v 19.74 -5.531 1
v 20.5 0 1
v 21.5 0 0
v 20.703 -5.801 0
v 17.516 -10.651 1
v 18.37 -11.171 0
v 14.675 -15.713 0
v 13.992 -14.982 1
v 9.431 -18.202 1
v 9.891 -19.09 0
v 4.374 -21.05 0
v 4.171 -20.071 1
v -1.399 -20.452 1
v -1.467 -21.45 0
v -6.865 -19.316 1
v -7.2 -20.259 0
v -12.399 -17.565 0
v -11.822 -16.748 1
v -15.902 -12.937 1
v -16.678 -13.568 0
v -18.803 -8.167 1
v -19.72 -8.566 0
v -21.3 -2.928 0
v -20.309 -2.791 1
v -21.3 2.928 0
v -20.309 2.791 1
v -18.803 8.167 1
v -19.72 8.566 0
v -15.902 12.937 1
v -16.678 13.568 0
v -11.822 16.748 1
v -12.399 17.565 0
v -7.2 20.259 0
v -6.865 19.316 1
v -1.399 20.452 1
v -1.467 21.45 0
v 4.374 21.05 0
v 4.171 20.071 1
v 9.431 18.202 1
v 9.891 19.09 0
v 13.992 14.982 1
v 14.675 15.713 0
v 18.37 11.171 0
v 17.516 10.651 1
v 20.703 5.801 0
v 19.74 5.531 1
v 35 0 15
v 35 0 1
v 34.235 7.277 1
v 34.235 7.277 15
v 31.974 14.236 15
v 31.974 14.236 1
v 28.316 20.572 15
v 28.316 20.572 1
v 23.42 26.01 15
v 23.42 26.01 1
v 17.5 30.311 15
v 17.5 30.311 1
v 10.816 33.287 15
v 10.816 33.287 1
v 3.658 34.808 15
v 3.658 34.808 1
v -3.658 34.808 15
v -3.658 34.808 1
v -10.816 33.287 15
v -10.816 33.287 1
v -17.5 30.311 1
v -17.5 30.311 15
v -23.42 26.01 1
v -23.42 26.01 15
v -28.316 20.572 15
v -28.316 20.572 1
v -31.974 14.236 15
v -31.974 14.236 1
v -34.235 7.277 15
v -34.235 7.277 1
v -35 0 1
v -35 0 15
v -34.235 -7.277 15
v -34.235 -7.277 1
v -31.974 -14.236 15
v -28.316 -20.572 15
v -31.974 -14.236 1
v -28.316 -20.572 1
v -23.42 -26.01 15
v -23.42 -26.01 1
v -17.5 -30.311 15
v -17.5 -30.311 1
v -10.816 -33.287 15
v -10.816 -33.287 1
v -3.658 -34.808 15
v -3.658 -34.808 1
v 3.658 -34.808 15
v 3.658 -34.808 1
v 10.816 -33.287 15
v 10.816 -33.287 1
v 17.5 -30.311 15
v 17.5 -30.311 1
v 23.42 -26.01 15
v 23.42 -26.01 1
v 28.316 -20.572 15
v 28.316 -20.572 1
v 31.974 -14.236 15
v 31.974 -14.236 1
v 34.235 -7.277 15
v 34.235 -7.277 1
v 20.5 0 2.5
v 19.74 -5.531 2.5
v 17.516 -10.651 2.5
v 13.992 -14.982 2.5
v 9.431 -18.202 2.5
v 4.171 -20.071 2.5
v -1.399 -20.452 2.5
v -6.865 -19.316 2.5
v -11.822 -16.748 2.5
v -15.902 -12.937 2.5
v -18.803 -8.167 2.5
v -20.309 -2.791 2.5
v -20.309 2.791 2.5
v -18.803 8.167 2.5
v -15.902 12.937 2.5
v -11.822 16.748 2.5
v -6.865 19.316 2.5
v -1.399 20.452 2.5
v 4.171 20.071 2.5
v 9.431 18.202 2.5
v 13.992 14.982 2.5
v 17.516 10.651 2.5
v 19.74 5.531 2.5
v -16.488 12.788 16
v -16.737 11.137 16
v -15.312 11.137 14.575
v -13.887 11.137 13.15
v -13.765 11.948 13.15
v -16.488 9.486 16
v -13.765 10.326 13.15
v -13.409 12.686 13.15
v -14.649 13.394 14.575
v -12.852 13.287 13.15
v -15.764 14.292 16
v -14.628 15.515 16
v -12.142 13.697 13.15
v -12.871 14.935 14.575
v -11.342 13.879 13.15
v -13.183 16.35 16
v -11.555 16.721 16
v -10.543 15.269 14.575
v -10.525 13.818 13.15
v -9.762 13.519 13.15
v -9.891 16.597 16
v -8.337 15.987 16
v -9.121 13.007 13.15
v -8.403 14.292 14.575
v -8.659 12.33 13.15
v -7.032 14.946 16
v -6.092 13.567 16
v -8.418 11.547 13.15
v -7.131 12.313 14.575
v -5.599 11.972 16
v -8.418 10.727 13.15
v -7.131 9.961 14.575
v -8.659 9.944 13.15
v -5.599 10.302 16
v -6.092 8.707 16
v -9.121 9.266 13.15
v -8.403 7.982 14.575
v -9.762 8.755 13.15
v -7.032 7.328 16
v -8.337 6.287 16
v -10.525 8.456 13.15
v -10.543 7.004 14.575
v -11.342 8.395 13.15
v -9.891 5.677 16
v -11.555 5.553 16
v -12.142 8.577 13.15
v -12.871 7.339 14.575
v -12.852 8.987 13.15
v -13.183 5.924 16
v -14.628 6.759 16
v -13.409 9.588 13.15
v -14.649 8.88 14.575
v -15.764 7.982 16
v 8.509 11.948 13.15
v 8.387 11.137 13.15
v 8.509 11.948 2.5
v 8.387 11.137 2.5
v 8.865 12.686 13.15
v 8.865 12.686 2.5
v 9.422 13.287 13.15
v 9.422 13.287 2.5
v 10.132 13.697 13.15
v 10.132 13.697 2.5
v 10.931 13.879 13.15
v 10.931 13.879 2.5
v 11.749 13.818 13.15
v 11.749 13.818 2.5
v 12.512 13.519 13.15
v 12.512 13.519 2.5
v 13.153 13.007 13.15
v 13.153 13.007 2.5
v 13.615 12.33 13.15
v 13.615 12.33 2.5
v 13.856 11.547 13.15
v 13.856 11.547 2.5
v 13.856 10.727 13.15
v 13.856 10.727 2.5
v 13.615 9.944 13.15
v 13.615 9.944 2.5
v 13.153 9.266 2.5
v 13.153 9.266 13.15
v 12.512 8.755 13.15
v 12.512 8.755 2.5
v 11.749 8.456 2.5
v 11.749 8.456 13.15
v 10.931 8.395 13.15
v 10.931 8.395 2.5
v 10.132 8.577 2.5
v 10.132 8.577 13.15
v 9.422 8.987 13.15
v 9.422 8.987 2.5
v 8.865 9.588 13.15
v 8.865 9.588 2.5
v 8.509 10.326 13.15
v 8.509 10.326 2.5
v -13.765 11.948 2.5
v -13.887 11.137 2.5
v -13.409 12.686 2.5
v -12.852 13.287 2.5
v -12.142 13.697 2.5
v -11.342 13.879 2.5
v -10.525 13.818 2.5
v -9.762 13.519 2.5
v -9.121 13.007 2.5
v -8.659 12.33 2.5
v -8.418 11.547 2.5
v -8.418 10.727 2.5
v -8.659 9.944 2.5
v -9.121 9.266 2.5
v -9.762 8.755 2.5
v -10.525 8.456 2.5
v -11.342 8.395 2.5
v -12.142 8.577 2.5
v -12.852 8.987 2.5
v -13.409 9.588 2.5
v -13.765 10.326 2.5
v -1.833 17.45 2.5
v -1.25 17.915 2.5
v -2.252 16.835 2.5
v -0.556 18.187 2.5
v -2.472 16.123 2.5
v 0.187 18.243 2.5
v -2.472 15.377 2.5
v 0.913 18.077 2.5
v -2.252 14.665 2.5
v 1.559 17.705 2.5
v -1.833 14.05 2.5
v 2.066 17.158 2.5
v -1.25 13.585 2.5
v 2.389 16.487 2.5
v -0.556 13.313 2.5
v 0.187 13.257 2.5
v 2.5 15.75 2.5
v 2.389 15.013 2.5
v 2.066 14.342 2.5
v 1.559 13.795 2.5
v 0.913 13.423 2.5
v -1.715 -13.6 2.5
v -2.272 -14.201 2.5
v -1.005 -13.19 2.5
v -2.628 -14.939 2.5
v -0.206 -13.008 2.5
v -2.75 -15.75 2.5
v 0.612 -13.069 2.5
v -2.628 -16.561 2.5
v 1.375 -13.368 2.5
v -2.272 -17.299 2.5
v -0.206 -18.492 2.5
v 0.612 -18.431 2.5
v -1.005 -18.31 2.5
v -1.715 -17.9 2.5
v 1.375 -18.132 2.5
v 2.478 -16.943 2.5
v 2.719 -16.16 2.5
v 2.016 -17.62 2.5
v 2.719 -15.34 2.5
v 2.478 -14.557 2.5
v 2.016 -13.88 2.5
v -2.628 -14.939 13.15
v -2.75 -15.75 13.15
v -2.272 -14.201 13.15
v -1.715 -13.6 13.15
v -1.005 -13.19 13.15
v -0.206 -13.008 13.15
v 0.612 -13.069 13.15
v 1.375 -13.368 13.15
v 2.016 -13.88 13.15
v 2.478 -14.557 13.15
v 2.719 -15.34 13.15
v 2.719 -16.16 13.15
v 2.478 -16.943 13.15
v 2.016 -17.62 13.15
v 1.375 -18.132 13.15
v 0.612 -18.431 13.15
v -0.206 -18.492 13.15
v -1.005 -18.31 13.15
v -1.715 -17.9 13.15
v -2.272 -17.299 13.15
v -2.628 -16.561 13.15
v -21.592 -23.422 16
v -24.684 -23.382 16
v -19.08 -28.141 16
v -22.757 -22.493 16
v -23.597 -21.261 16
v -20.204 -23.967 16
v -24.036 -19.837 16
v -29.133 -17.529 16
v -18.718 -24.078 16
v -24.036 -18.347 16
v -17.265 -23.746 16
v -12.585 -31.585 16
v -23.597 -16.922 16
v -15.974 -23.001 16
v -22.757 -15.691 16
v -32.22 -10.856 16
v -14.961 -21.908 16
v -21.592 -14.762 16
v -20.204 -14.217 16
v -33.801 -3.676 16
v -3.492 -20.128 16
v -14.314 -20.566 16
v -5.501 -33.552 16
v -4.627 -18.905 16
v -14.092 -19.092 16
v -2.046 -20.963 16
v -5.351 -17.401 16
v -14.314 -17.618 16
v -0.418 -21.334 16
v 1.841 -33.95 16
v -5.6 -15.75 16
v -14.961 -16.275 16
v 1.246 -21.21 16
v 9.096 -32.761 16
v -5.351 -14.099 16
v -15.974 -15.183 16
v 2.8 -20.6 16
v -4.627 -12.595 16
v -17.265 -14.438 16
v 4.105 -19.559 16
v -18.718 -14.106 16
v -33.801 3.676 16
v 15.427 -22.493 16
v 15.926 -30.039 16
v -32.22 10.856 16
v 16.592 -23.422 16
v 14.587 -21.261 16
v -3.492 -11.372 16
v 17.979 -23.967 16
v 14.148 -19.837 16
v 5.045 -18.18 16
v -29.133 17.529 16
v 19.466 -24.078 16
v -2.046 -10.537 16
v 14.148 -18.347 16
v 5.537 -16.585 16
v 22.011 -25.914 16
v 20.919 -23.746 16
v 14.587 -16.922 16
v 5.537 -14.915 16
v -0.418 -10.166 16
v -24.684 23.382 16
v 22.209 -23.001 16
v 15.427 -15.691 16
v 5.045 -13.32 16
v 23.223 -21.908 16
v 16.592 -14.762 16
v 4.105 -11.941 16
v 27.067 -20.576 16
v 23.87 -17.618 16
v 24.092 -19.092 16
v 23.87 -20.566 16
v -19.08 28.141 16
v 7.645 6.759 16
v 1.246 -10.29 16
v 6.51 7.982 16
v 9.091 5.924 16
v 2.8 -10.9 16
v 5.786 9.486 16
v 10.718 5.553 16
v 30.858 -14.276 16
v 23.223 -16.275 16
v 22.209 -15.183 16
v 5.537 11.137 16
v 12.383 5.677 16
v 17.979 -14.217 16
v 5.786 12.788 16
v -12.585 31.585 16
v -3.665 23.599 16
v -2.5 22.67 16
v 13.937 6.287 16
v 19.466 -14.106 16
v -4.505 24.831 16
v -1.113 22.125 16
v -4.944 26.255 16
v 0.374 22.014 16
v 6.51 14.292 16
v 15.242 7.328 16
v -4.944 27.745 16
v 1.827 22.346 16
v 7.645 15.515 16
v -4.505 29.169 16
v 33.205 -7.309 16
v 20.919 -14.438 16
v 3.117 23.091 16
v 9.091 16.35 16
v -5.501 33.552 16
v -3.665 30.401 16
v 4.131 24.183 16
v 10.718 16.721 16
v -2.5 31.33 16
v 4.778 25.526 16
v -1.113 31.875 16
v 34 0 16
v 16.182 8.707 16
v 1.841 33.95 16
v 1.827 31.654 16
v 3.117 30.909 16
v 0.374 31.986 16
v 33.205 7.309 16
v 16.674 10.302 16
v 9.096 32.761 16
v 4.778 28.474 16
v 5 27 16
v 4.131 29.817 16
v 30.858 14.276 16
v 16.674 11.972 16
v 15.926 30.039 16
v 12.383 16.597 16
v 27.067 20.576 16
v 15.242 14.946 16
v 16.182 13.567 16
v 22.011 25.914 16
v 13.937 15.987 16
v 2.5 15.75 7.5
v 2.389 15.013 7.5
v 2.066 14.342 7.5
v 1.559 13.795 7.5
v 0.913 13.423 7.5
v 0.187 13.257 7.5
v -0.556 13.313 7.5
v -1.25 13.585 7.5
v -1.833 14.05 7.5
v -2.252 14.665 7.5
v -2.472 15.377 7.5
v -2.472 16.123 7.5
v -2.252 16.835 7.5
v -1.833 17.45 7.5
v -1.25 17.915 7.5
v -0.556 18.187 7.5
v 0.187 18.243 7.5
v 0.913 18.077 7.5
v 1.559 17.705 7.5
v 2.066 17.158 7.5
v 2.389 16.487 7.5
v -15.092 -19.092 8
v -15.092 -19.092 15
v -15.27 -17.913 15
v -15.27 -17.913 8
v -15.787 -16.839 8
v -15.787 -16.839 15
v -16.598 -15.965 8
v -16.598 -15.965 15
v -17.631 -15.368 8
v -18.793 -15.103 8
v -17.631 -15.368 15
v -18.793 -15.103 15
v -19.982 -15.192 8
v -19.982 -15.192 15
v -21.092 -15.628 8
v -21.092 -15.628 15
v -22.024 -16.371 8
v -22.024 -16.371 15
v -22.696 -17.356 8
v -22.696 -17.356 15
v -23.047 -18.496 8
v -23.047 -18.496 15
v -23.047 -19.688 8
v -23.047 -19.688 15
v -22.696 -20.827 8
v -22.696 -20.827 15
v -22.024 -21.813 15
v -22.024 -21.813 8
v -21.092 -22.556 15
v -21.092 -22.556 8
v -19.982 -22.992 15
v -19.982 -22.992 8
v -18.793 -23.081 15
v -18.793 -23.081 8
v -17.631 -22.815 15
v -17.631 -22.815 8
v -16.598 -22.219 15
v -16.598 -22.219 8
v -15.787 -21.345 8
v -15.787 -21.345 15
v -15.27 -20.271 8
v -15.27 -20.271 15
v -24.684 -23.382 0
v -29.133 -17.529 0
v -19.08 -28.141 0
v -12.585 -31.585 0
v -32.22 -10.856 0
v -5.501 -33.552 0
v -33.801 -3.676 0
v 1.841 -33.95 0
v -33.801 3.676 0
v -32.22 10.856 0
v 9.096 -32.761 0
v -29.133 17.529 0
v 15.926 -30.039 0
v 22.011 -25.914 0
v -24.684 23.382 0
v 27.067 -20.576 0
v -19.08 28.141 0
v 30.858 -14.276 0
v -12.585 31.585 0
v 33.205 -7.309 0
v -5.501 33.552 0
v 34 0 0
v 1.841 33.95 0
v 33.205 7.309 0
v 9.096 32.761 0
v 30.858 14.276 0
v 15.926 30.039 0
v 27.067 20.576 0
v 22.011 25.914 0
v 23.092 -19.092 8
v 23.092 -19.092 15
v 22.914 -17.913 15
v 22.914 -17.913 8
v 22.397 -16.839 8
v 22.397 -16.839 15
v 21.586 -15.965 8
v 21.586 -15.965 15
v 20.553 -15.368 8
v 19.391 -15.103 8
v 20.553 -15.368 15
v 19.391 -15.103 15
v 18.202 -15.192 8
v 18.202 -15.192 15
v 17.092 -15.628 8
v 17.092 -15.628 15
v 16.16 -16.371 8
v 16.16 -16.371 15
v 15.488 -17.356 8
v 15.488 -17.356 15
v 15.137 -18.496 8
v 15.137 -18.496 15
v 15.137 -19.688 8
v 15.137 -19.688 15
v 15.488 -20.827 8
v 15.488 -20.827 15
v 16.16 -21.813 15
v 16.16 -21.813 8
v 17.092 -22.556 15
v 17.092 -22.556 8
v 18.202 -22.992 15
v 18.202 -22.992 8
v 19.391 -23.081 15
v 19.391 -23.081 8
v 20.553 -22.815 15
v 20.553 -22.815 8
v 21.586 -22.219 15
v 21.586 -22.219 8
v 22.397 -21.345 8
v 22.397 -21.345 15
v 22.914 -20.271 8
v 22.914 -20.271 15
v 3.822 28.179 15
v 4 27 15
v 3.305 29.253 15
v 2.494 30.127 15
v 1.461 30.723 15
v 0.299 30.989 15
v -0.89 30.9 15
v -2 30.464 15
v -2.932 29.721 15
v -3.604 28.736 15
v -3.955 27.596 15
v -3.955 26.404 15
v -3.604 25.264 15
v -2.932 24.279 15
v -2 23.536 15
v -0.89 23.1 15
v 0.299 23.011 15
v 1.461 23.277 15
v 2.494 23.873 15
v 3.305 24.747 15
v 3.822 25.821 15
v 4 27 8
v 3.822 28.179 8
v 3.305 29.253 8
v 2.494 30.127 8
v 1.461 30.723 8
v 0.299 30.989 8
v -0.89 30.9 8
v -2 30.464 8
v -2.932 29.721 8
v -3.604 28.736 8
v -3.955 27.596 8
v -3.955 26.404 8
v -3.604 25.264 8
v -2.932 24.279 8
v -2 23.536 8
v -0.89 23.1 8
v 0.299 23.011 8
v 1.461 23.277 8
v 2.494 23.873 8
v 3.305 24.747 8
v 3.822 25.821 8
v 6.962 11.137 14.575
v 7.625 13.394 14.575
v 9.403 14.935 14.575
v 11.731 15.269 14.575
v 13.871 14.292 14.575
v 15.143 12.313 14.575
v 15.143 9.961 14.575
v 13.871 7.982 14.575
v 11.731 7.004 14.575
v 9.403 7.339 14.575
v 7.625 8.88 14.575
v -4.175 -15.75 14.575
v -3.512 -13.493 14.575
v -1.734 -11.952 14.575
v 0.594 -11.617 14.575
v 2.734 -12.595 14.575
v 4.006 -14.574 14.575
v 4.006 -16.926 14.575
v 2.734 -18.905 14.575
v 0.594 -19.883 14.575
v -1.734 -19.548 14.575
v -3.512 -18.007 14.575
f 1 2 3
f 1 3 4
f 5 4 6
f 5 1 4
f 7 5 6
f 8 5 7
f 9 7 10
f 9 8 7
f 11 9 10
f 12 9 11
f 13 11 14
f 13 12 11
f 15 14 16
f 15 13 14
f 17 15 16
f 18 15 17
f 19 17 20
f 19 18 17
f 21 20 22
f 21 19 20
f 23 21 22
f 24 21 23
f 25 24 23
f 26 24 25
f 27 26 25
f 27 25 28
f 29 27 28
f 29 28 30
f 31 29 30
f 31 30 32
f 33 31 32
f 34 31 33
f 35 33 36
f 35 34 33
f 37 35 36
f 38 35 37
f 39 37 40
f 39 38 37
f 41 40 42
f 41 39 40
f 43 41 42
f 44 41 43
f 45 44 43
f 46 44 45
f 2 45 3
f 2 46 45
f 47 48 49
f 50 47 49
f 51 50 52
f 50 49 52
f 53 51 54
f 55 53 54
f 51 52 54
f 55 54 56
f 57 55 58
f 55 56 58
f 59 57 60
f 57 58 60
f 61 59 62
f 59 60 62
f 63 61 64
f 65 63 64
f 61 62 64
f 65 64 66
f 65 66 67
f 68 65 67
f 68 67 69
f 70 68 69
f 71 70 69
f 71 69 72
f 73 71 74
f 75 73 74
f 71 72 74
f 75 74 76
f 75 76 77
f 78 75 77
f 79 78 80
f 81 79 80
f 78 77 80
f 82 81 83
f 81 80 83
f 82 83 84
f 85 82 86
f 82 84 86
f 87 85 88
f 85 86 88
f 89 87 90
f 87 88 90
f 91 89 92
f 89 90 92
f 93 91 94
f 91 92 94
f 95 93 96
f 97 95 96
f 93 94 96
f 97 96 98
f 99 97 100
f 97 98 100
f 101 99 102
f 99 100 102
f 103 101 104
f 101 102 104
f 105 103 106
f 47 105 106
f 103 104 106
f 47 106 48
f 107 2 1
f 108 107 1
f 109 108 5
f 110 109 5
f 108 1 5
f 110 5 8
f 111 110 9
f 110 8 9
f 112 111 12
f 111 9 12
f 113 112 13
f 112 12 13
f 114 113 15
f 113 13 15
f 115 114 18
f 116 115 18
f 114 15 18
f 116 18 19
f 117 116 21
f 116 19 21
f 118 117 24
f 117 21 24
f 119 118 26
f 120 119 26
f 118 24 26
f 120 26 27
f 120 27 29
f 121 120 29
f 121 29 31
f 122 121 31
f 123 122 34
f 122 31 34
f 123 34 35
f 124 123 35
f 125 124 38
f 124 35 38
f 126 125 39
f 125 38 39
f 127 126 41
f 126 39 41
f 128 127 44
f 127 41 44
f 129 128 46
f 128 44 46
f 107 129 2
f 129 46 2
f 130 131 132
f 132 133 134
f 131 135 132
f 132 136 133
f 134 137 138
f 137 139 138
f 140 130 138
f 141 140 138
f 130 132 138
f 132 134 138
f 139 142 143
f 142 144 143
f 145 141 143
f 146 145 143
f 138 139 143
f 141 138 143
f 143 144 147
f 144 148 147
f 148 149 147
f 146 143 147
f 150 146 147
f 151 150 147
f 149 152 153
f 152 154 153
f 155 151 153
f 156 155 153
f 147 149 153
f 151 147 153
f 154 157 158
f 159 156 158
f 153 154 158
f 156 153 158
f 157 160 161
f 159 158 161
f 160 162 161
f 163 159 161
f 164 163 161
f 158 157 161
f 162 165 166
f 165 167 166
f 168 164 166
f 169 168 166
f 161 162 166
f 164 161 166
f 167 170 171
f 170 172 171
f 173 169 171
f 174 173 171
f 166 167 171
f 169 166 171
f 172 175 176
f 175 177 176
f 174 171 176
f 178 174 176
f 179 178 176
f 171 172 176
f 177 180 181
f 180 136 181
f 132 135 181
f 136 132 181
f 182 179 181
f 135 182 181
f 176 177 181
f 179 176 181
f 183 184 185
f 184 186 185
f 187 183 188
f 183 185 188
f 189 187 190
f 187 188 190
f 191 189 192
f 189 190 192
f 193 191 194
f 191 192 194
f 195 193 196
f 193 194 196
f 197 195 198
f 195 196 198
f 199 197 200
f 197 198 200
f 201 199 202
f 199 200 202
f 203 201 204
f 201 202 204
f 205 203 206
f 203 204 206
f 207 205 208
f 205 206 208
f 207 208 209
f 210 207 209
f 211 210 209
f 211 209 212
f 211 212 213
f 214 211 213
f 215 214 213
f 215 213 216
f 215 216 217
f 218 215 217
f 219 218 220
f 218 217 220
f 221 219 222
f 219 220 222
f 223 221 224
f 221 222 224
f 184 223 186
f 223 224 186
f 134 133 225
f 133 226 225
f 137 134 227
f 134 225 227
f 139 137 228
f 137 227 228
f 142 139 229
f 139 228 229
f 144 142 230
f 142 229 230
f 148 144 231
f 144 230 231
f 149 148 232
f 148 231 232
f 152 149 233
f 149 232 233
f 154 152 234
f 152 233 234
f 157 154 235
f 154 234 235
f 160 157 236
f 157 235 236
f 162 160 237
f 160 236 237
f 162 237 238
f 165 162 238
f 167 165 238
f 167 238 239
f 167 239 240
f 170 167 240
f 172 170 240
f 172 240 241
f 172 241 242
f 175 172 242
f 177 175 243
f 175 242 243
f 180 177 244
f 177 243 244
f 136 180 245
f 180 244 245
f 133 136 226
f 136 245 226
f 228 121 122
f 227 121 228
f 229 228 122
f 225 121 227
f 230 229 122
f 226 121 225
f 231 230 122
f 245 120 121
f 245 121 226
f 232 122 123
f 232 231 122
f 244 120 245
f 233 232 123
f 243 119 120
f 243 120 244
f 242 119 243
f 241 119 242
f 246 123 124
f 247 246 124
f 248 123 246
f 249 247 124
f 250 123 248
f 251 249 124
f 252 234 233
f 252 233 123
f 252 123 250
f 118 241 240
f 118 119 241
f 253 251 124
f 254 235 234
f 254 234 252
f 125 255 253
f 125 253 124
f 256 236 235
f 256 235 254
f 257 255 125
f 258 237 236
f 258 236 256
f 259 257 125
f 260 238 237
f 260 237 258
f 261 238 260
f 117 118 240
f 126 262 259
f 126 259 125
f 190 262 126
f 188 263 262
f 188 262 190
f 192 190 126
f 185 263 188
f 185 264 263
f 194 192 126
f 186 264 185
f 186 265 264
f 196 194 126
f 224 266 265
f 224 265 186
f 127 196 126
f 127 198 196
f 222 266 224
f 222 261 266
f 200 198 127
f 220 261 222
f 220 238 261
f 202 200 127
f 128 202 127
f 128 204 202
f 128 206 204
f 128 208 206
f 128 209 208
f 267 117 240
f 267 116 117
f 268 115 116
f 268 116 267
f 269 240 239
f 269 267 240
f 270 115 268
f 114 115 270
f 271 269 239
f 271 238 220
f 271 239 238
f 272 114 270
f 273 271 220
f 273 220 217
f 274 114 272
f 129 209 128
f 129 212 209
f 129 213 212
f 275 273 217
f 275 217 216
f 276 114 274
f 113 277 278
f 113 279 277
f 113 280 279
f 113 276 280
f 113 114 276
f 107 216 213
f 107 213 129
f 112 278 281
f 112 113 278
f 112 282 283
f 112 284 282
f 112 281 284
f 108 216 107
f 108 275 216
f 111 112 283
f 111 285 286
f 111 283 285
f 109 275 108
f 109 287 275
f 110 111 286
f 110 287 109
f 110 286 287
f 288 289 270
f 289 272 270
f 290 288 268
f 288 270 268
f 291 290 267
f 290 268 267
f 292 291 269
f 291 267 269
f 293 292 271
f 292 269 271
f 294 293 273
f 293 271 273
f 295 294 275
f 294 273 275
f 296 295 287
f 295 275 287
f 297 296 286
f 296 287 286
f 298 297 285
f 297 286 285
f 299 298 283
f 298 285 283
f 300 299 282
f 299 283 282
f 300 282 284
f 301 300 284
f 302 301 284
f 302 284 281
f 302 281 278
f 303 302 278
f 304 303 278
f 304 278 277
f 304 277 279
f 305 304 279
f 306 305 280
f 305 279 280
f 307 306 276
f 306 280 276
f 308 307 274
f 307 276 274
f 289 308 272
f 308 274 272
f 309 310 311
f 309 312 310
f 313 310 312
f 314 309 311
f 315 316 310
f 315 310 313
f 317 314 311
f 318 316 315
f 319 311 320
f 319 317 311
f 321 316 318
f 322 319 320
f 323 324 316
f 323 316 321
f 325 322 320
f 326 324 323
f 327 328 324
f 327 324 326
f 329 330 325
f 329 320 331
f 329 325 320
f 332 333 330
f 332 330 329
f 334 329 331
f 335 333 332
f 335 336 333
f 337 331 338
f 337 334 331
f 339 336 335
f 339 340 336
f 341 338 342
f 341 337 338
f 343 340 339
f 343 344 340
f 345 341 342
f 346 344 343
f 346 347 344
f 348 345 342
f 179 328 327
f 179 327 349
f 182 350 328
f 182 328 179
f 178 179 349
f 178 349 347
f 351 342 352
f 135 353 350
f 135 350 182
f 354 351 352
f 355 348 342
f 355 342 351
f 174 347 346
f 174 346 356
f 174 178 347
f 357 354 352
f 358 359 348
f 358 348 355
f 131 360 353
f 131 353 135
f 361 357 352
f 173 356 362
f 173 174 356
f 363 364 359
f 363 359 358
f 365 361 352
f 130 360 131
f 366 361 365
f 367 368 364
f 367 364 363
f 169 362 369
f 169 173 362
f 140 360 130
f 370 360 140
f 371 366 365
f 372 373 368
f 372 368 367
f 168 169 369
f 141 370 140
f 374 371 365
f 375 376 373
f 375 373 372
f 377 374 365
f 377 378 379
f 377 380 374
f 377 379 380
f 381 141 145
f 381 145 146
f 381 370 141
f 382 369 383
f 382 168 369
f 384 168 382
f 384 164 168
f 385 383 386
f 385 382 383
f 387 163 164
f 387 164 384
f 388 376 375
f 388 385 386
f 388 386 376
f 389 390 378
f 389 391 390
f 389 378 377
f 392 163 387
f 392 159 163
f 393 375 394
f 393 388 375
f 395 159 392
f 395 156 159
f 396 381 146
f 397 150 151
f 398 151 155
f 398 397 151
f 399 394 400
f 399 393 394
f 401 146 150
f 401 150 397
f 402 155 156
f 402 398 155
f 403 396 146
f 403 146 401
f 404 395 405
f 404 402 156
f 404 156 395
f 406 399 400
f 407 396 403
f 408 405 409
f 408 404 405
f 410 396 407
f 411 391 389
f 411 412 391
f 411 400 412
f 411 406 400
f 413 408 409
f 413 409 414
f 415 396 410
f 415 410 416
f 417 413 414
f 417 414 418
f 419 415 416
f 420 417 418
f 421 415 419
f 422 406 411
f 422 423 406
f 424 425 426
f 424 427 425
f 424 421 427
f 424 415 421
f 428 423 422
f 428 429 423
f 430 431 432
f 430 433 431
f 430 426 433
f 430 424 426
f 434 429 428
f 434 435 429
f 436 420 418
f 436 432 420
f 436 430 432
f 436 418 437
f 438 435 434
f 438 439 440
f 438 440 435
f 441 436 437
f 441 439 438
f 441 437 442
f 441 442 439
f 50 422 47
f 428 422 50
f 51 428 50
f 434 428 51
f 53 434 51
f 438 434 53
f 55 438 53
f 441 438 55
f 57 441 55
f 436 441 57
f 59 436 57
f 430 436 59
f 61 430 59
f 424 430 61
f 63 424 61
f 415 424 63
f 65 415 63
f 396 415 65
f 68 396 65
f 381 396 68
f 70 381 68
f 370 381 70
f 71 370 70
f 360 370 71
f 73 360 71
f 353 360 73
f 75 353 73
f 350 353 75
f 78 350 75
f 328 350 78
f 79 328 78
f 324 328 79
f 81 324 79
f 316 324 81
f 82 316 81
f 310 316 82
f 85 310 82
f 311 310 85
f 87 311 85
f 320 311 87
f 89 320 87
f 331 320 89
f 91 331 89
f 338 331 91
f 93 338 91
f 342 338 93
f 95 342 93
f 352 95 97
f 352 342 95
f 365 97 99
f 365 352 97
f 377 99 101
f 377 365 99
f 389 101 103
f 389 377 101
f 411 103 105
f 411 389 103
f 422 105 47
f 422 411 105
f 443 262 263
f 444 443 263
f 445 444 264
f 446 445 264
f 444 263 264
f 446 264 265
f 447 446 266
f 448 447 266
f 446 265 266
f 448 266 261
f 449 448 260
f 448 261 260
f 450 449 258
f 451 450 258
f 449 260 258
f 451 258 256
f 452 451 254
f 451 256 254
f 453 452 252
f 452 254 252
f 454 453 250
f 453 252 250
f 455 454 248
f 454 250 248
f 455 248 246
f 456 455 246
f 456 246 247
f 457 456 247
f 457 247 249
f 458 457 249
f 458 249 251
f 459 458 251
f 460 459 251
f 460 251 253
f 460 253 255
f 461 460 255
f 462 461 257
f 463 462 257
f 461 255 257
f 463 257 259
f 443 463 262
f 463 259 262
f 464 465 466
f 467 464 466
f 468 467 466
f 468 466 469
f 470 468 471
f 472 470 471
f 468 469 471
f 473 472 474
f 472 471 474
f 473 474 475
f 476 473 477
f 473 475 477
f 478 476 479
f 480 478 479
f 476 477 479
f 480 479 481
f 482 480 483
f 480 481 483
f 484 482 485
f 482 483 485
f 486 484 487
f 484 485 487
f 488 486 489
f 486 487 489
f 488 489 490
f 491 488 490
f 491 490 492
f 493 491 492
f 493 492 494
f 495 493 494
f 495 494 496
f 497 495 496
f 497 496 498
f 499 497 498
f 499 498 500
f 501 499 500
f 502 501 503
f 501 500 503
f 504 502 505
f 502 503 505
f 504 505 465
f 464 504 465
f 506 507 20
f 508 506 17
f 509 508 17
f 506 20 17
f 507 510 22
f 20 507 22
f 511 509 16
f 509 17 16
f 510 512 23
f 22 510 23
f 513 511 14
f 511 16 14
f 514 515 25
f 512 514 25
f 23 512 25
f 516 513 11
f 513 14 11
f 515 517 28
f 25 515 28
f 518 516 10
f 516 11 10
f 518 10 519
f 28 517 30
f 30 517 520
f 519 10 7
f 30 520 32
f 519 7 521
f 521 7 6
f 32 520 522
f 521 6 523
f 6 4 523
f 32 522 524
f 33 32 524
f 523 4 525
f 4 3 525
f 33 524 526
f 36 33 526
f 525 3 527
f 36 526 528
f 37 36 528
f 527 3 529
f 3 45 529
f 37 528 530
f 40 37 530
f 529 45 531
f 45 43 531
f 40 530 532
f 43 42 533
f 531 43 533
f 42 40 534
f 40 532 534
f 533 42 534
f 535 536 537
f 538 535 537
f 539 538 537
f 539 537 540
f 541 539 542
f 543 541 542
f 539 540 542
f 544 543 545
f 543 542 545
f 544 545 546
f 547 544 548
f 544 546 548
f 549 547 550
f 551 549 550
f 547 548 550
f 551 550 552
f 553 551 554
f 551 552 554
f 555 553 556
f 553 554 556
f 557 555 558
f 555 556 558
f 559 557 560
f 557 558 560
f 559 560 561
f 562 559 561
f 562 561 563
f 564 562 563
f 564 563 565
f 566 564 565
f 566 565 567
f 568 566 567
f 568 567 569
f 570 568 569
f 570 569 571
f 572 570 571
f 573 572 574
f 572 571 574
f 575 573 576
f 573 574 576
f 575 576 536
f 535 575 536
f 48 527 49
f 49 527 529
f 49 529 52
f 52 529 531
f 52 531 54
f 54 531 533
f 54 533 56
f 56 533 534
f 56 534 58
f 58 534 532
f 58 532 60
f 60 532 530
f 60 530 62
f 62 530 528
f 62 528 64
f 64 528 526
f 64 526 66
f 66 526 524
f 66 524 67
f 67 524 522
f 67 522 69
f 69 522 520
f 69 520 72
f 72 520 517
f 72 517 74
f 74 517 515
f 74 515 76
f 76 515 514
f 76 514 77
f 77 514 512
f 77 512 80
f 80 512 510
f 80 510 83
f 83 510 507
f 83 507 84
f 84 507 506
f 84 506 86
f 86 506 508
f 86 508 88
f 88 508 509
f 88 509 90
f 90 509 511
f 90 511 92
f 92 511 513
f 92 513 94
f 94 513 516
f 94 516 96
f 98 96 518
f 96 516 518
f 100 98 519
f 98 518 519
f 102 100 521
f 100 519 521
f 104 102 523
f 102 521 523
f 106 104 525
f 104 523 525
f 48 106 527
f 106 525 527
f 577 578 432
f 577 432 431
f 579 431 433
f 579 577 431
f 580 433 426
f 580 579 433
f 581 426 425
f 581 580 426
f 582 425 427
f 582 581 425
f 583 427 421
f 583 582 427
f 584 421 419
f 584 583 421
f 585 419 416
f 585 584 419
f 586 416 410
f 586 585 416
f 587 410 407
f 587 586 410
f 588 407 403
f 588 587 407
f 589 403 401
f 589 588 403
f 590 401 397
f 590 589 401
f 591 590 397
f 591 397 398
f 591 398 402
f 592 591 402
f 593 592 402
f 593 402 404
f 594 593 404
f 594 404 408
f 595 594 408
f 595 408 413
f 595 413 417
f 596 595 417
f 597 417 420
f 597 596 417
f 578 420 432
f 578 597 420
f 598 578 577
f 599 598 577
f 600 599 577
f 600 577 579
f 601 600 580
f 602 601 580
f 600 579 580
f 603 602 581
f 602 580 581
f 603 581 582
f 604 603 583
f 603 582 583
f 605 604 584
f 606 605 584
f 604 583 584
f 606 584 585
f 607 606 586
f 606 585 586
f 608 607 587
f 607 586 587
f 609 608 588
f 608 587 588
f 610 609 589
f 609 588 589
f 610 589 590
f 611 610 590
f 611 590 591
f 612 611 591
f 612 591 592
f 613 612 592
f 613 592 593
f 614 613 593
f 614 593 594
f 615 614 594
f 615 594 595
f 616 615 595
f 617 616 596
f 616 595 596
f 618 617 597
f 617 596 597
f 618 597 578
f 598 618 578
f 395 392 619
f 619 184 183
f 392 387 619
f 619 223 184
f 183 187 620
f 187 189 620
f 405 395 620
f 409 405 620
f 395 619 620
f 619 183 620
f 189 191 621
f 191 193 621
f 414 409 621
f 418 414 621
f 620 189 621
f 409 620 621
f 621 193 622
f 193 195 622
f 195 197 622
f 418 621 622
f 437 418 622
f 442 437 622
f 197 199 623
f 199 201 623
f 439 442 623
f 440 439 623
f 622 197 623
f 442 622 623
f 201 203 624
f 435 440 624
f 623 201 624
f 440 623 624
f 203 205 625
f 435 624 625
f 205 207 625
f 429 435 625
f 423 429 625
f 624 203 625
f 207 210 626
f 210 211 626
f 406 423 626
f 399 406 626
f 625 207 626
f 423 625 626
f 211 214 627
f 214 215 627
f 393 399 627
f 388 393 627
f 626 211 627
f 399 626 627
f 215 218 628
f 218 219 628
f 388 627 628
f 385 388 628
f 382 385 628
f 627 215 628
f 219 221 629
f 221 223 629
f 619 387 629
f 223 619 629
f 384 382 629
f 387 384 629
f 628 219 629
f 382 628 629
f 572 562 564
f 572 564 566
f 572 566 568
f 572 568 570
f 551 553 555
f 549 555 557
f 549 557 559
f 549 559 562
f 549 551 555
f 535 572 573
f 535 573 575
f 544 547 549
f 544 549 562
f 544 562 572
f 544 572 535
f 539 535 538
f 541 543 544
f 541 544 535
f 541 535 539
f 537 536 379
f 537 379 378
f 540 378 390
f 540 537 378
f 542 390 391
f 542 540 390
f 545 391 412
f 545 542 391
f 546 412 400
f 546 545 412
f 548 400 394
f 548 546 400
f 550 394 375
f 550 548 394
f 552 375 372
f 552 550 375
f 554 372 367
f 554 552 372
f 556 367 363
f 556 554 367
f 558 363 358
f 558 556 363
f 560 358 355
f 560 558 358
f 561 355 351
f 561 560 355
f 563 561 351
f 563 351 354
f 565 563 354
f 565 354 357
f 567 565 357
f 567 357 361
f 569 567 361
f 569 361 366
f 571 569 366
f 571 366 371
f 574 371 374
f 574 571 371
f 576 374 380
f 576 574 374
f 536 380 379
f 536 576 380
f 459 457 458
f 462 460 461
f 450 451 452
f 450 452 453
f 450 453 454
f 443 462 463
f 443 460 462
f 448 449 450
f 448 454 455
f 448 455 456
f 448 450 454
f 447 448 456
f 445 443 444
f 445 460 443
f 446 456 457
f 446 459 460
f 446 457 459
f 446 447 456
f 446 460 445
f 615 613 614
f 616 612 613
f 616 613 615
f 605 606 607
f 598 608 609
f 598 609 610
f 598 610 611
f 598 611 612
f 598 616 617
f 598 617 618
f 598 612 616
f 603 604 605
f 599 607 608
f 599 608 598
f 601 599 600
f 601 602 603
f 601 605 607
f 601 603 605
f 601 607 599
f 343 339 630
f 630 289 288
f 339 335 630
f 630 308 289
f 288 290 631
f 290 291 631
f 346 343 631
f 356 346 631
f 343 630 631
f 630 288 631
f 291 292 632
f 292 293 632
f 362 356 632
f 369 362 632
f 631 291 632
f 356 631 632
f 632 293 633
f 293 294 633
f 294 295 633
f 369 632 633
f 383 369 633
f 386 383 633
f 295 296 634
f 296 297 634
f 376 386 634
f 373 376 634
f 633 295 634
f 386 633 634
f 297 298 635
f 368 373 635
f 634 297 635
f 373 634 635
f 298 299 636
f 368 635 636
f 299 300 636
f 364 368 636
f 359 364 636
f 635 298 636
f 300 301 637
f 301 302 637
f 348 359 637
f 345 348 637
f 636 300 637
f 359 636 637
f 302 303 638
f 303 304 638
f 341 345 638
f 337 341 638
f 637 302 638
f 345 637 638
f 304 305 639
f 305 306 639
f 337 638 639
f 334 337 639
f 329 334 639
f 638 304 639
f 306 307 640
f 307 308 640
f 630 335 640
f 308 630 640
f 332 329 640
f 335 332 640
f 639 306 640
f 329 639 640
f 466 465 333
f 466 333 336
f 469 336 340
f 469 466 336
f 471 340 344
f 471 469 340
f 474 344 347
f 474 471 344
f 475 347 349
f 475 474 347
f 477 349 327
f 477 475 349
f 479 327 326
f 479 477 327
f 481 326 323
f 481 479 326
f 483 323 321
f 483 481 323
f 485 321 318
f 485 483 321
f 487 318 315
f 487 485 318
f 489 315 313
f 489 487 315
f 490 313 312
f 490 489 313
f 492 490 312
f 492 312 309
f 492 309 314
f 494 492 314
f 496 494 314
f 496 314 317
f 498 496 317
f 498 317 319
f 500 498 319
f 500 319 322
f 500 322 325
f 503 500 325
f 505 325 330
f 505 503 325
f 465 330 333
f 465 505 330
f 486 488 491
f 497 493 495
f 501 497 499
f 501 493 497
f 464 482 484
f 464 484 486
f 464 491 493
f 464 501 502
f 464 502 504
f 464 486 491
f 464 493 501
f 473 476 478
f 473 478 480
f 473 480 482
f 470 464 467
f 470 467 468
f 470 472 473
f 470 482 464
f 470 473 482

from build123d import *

# Parameters (mm, degrees)
F0_R           = 35
F1_DEPTH       = 16
F2_R           = 20.5
F3_DEPTH       = 2.5
F4_R           = 4
F5_DEPTH       = 8
F6_D           = 5.5
F6_CSINK_D     = 11.2
F6_CSINK_ANGLE = 90
F7_R           = 2.5
F8_DEPTH       = 5
F9_SIZE        = 1


with BuildPart() as f1:
    # F0 (on Top) → F1 (new body)
    with BuildSketch(Plane.XY):
        Circle(F0_R)
    extrude(amount=F1_DEPTH)

    # F2 (on face) → F3 (cut)
    with BuildSketch(Plane(origin=(0, 0, 0), x_dir=(1, 0, 0), z_dir=(0, 0, -1))):
        Circle(F2_R)
    extrude(amount=-F3_DEPTH, mode=Mode.SUBTRACT)

    # F4 (on face) → F5 (cut)
    with BuildSketch(Plane.XY.offset(16)):
        with Locations((0, 27)):
            Circle(F4_R)
        with Locations((19.091883092, -19.091883092)):
            Circle(F4_R)
        with Locations((-19.091883092, -19.091883092)):
            Circle(F4_R)
    extrude(amount=-F5_DEPTH, mode=Mode.SUBTRACT)

    # F6 (through all)
    with Locations(Plane.XY.offset(16)):
        with Locations((-11.1369318037, 11.1369318037), (11.1369318037, 11.1369318037), (0, -15.75)):
            CounterSinkHole(F6_D / 2, F6_CSINK_D / 2, counter_sink_angle=F6_CSINK_ANGLE)

    # F7 (on face) → F8 (cut)
    with BuildSketch(Plane(origin=(0, 0, 2.5), x_dir=(1, 0, 0), z_dir=(0, 0, -1))):
        with Locations((0, -15.75)):
            Circle(F7_R)
    extrude(amount=-F8_DEPTH, mode=Mode.SUBTRACT)

    # F9
    f9_edges = [f1.edges().sort_by_distance(p)[0] for p in [
        (-20.5, 0, 0),
        (-35, 0, 0),
        (-35, 0, 16),
        (-23.091883, -19.091883, 16),
        (-4, 27, 16),
        (15.091883, -19.091883, 16),
    ]]
    chamfer(f9_edges, length=F9_SIZE)


solid = f1.part
